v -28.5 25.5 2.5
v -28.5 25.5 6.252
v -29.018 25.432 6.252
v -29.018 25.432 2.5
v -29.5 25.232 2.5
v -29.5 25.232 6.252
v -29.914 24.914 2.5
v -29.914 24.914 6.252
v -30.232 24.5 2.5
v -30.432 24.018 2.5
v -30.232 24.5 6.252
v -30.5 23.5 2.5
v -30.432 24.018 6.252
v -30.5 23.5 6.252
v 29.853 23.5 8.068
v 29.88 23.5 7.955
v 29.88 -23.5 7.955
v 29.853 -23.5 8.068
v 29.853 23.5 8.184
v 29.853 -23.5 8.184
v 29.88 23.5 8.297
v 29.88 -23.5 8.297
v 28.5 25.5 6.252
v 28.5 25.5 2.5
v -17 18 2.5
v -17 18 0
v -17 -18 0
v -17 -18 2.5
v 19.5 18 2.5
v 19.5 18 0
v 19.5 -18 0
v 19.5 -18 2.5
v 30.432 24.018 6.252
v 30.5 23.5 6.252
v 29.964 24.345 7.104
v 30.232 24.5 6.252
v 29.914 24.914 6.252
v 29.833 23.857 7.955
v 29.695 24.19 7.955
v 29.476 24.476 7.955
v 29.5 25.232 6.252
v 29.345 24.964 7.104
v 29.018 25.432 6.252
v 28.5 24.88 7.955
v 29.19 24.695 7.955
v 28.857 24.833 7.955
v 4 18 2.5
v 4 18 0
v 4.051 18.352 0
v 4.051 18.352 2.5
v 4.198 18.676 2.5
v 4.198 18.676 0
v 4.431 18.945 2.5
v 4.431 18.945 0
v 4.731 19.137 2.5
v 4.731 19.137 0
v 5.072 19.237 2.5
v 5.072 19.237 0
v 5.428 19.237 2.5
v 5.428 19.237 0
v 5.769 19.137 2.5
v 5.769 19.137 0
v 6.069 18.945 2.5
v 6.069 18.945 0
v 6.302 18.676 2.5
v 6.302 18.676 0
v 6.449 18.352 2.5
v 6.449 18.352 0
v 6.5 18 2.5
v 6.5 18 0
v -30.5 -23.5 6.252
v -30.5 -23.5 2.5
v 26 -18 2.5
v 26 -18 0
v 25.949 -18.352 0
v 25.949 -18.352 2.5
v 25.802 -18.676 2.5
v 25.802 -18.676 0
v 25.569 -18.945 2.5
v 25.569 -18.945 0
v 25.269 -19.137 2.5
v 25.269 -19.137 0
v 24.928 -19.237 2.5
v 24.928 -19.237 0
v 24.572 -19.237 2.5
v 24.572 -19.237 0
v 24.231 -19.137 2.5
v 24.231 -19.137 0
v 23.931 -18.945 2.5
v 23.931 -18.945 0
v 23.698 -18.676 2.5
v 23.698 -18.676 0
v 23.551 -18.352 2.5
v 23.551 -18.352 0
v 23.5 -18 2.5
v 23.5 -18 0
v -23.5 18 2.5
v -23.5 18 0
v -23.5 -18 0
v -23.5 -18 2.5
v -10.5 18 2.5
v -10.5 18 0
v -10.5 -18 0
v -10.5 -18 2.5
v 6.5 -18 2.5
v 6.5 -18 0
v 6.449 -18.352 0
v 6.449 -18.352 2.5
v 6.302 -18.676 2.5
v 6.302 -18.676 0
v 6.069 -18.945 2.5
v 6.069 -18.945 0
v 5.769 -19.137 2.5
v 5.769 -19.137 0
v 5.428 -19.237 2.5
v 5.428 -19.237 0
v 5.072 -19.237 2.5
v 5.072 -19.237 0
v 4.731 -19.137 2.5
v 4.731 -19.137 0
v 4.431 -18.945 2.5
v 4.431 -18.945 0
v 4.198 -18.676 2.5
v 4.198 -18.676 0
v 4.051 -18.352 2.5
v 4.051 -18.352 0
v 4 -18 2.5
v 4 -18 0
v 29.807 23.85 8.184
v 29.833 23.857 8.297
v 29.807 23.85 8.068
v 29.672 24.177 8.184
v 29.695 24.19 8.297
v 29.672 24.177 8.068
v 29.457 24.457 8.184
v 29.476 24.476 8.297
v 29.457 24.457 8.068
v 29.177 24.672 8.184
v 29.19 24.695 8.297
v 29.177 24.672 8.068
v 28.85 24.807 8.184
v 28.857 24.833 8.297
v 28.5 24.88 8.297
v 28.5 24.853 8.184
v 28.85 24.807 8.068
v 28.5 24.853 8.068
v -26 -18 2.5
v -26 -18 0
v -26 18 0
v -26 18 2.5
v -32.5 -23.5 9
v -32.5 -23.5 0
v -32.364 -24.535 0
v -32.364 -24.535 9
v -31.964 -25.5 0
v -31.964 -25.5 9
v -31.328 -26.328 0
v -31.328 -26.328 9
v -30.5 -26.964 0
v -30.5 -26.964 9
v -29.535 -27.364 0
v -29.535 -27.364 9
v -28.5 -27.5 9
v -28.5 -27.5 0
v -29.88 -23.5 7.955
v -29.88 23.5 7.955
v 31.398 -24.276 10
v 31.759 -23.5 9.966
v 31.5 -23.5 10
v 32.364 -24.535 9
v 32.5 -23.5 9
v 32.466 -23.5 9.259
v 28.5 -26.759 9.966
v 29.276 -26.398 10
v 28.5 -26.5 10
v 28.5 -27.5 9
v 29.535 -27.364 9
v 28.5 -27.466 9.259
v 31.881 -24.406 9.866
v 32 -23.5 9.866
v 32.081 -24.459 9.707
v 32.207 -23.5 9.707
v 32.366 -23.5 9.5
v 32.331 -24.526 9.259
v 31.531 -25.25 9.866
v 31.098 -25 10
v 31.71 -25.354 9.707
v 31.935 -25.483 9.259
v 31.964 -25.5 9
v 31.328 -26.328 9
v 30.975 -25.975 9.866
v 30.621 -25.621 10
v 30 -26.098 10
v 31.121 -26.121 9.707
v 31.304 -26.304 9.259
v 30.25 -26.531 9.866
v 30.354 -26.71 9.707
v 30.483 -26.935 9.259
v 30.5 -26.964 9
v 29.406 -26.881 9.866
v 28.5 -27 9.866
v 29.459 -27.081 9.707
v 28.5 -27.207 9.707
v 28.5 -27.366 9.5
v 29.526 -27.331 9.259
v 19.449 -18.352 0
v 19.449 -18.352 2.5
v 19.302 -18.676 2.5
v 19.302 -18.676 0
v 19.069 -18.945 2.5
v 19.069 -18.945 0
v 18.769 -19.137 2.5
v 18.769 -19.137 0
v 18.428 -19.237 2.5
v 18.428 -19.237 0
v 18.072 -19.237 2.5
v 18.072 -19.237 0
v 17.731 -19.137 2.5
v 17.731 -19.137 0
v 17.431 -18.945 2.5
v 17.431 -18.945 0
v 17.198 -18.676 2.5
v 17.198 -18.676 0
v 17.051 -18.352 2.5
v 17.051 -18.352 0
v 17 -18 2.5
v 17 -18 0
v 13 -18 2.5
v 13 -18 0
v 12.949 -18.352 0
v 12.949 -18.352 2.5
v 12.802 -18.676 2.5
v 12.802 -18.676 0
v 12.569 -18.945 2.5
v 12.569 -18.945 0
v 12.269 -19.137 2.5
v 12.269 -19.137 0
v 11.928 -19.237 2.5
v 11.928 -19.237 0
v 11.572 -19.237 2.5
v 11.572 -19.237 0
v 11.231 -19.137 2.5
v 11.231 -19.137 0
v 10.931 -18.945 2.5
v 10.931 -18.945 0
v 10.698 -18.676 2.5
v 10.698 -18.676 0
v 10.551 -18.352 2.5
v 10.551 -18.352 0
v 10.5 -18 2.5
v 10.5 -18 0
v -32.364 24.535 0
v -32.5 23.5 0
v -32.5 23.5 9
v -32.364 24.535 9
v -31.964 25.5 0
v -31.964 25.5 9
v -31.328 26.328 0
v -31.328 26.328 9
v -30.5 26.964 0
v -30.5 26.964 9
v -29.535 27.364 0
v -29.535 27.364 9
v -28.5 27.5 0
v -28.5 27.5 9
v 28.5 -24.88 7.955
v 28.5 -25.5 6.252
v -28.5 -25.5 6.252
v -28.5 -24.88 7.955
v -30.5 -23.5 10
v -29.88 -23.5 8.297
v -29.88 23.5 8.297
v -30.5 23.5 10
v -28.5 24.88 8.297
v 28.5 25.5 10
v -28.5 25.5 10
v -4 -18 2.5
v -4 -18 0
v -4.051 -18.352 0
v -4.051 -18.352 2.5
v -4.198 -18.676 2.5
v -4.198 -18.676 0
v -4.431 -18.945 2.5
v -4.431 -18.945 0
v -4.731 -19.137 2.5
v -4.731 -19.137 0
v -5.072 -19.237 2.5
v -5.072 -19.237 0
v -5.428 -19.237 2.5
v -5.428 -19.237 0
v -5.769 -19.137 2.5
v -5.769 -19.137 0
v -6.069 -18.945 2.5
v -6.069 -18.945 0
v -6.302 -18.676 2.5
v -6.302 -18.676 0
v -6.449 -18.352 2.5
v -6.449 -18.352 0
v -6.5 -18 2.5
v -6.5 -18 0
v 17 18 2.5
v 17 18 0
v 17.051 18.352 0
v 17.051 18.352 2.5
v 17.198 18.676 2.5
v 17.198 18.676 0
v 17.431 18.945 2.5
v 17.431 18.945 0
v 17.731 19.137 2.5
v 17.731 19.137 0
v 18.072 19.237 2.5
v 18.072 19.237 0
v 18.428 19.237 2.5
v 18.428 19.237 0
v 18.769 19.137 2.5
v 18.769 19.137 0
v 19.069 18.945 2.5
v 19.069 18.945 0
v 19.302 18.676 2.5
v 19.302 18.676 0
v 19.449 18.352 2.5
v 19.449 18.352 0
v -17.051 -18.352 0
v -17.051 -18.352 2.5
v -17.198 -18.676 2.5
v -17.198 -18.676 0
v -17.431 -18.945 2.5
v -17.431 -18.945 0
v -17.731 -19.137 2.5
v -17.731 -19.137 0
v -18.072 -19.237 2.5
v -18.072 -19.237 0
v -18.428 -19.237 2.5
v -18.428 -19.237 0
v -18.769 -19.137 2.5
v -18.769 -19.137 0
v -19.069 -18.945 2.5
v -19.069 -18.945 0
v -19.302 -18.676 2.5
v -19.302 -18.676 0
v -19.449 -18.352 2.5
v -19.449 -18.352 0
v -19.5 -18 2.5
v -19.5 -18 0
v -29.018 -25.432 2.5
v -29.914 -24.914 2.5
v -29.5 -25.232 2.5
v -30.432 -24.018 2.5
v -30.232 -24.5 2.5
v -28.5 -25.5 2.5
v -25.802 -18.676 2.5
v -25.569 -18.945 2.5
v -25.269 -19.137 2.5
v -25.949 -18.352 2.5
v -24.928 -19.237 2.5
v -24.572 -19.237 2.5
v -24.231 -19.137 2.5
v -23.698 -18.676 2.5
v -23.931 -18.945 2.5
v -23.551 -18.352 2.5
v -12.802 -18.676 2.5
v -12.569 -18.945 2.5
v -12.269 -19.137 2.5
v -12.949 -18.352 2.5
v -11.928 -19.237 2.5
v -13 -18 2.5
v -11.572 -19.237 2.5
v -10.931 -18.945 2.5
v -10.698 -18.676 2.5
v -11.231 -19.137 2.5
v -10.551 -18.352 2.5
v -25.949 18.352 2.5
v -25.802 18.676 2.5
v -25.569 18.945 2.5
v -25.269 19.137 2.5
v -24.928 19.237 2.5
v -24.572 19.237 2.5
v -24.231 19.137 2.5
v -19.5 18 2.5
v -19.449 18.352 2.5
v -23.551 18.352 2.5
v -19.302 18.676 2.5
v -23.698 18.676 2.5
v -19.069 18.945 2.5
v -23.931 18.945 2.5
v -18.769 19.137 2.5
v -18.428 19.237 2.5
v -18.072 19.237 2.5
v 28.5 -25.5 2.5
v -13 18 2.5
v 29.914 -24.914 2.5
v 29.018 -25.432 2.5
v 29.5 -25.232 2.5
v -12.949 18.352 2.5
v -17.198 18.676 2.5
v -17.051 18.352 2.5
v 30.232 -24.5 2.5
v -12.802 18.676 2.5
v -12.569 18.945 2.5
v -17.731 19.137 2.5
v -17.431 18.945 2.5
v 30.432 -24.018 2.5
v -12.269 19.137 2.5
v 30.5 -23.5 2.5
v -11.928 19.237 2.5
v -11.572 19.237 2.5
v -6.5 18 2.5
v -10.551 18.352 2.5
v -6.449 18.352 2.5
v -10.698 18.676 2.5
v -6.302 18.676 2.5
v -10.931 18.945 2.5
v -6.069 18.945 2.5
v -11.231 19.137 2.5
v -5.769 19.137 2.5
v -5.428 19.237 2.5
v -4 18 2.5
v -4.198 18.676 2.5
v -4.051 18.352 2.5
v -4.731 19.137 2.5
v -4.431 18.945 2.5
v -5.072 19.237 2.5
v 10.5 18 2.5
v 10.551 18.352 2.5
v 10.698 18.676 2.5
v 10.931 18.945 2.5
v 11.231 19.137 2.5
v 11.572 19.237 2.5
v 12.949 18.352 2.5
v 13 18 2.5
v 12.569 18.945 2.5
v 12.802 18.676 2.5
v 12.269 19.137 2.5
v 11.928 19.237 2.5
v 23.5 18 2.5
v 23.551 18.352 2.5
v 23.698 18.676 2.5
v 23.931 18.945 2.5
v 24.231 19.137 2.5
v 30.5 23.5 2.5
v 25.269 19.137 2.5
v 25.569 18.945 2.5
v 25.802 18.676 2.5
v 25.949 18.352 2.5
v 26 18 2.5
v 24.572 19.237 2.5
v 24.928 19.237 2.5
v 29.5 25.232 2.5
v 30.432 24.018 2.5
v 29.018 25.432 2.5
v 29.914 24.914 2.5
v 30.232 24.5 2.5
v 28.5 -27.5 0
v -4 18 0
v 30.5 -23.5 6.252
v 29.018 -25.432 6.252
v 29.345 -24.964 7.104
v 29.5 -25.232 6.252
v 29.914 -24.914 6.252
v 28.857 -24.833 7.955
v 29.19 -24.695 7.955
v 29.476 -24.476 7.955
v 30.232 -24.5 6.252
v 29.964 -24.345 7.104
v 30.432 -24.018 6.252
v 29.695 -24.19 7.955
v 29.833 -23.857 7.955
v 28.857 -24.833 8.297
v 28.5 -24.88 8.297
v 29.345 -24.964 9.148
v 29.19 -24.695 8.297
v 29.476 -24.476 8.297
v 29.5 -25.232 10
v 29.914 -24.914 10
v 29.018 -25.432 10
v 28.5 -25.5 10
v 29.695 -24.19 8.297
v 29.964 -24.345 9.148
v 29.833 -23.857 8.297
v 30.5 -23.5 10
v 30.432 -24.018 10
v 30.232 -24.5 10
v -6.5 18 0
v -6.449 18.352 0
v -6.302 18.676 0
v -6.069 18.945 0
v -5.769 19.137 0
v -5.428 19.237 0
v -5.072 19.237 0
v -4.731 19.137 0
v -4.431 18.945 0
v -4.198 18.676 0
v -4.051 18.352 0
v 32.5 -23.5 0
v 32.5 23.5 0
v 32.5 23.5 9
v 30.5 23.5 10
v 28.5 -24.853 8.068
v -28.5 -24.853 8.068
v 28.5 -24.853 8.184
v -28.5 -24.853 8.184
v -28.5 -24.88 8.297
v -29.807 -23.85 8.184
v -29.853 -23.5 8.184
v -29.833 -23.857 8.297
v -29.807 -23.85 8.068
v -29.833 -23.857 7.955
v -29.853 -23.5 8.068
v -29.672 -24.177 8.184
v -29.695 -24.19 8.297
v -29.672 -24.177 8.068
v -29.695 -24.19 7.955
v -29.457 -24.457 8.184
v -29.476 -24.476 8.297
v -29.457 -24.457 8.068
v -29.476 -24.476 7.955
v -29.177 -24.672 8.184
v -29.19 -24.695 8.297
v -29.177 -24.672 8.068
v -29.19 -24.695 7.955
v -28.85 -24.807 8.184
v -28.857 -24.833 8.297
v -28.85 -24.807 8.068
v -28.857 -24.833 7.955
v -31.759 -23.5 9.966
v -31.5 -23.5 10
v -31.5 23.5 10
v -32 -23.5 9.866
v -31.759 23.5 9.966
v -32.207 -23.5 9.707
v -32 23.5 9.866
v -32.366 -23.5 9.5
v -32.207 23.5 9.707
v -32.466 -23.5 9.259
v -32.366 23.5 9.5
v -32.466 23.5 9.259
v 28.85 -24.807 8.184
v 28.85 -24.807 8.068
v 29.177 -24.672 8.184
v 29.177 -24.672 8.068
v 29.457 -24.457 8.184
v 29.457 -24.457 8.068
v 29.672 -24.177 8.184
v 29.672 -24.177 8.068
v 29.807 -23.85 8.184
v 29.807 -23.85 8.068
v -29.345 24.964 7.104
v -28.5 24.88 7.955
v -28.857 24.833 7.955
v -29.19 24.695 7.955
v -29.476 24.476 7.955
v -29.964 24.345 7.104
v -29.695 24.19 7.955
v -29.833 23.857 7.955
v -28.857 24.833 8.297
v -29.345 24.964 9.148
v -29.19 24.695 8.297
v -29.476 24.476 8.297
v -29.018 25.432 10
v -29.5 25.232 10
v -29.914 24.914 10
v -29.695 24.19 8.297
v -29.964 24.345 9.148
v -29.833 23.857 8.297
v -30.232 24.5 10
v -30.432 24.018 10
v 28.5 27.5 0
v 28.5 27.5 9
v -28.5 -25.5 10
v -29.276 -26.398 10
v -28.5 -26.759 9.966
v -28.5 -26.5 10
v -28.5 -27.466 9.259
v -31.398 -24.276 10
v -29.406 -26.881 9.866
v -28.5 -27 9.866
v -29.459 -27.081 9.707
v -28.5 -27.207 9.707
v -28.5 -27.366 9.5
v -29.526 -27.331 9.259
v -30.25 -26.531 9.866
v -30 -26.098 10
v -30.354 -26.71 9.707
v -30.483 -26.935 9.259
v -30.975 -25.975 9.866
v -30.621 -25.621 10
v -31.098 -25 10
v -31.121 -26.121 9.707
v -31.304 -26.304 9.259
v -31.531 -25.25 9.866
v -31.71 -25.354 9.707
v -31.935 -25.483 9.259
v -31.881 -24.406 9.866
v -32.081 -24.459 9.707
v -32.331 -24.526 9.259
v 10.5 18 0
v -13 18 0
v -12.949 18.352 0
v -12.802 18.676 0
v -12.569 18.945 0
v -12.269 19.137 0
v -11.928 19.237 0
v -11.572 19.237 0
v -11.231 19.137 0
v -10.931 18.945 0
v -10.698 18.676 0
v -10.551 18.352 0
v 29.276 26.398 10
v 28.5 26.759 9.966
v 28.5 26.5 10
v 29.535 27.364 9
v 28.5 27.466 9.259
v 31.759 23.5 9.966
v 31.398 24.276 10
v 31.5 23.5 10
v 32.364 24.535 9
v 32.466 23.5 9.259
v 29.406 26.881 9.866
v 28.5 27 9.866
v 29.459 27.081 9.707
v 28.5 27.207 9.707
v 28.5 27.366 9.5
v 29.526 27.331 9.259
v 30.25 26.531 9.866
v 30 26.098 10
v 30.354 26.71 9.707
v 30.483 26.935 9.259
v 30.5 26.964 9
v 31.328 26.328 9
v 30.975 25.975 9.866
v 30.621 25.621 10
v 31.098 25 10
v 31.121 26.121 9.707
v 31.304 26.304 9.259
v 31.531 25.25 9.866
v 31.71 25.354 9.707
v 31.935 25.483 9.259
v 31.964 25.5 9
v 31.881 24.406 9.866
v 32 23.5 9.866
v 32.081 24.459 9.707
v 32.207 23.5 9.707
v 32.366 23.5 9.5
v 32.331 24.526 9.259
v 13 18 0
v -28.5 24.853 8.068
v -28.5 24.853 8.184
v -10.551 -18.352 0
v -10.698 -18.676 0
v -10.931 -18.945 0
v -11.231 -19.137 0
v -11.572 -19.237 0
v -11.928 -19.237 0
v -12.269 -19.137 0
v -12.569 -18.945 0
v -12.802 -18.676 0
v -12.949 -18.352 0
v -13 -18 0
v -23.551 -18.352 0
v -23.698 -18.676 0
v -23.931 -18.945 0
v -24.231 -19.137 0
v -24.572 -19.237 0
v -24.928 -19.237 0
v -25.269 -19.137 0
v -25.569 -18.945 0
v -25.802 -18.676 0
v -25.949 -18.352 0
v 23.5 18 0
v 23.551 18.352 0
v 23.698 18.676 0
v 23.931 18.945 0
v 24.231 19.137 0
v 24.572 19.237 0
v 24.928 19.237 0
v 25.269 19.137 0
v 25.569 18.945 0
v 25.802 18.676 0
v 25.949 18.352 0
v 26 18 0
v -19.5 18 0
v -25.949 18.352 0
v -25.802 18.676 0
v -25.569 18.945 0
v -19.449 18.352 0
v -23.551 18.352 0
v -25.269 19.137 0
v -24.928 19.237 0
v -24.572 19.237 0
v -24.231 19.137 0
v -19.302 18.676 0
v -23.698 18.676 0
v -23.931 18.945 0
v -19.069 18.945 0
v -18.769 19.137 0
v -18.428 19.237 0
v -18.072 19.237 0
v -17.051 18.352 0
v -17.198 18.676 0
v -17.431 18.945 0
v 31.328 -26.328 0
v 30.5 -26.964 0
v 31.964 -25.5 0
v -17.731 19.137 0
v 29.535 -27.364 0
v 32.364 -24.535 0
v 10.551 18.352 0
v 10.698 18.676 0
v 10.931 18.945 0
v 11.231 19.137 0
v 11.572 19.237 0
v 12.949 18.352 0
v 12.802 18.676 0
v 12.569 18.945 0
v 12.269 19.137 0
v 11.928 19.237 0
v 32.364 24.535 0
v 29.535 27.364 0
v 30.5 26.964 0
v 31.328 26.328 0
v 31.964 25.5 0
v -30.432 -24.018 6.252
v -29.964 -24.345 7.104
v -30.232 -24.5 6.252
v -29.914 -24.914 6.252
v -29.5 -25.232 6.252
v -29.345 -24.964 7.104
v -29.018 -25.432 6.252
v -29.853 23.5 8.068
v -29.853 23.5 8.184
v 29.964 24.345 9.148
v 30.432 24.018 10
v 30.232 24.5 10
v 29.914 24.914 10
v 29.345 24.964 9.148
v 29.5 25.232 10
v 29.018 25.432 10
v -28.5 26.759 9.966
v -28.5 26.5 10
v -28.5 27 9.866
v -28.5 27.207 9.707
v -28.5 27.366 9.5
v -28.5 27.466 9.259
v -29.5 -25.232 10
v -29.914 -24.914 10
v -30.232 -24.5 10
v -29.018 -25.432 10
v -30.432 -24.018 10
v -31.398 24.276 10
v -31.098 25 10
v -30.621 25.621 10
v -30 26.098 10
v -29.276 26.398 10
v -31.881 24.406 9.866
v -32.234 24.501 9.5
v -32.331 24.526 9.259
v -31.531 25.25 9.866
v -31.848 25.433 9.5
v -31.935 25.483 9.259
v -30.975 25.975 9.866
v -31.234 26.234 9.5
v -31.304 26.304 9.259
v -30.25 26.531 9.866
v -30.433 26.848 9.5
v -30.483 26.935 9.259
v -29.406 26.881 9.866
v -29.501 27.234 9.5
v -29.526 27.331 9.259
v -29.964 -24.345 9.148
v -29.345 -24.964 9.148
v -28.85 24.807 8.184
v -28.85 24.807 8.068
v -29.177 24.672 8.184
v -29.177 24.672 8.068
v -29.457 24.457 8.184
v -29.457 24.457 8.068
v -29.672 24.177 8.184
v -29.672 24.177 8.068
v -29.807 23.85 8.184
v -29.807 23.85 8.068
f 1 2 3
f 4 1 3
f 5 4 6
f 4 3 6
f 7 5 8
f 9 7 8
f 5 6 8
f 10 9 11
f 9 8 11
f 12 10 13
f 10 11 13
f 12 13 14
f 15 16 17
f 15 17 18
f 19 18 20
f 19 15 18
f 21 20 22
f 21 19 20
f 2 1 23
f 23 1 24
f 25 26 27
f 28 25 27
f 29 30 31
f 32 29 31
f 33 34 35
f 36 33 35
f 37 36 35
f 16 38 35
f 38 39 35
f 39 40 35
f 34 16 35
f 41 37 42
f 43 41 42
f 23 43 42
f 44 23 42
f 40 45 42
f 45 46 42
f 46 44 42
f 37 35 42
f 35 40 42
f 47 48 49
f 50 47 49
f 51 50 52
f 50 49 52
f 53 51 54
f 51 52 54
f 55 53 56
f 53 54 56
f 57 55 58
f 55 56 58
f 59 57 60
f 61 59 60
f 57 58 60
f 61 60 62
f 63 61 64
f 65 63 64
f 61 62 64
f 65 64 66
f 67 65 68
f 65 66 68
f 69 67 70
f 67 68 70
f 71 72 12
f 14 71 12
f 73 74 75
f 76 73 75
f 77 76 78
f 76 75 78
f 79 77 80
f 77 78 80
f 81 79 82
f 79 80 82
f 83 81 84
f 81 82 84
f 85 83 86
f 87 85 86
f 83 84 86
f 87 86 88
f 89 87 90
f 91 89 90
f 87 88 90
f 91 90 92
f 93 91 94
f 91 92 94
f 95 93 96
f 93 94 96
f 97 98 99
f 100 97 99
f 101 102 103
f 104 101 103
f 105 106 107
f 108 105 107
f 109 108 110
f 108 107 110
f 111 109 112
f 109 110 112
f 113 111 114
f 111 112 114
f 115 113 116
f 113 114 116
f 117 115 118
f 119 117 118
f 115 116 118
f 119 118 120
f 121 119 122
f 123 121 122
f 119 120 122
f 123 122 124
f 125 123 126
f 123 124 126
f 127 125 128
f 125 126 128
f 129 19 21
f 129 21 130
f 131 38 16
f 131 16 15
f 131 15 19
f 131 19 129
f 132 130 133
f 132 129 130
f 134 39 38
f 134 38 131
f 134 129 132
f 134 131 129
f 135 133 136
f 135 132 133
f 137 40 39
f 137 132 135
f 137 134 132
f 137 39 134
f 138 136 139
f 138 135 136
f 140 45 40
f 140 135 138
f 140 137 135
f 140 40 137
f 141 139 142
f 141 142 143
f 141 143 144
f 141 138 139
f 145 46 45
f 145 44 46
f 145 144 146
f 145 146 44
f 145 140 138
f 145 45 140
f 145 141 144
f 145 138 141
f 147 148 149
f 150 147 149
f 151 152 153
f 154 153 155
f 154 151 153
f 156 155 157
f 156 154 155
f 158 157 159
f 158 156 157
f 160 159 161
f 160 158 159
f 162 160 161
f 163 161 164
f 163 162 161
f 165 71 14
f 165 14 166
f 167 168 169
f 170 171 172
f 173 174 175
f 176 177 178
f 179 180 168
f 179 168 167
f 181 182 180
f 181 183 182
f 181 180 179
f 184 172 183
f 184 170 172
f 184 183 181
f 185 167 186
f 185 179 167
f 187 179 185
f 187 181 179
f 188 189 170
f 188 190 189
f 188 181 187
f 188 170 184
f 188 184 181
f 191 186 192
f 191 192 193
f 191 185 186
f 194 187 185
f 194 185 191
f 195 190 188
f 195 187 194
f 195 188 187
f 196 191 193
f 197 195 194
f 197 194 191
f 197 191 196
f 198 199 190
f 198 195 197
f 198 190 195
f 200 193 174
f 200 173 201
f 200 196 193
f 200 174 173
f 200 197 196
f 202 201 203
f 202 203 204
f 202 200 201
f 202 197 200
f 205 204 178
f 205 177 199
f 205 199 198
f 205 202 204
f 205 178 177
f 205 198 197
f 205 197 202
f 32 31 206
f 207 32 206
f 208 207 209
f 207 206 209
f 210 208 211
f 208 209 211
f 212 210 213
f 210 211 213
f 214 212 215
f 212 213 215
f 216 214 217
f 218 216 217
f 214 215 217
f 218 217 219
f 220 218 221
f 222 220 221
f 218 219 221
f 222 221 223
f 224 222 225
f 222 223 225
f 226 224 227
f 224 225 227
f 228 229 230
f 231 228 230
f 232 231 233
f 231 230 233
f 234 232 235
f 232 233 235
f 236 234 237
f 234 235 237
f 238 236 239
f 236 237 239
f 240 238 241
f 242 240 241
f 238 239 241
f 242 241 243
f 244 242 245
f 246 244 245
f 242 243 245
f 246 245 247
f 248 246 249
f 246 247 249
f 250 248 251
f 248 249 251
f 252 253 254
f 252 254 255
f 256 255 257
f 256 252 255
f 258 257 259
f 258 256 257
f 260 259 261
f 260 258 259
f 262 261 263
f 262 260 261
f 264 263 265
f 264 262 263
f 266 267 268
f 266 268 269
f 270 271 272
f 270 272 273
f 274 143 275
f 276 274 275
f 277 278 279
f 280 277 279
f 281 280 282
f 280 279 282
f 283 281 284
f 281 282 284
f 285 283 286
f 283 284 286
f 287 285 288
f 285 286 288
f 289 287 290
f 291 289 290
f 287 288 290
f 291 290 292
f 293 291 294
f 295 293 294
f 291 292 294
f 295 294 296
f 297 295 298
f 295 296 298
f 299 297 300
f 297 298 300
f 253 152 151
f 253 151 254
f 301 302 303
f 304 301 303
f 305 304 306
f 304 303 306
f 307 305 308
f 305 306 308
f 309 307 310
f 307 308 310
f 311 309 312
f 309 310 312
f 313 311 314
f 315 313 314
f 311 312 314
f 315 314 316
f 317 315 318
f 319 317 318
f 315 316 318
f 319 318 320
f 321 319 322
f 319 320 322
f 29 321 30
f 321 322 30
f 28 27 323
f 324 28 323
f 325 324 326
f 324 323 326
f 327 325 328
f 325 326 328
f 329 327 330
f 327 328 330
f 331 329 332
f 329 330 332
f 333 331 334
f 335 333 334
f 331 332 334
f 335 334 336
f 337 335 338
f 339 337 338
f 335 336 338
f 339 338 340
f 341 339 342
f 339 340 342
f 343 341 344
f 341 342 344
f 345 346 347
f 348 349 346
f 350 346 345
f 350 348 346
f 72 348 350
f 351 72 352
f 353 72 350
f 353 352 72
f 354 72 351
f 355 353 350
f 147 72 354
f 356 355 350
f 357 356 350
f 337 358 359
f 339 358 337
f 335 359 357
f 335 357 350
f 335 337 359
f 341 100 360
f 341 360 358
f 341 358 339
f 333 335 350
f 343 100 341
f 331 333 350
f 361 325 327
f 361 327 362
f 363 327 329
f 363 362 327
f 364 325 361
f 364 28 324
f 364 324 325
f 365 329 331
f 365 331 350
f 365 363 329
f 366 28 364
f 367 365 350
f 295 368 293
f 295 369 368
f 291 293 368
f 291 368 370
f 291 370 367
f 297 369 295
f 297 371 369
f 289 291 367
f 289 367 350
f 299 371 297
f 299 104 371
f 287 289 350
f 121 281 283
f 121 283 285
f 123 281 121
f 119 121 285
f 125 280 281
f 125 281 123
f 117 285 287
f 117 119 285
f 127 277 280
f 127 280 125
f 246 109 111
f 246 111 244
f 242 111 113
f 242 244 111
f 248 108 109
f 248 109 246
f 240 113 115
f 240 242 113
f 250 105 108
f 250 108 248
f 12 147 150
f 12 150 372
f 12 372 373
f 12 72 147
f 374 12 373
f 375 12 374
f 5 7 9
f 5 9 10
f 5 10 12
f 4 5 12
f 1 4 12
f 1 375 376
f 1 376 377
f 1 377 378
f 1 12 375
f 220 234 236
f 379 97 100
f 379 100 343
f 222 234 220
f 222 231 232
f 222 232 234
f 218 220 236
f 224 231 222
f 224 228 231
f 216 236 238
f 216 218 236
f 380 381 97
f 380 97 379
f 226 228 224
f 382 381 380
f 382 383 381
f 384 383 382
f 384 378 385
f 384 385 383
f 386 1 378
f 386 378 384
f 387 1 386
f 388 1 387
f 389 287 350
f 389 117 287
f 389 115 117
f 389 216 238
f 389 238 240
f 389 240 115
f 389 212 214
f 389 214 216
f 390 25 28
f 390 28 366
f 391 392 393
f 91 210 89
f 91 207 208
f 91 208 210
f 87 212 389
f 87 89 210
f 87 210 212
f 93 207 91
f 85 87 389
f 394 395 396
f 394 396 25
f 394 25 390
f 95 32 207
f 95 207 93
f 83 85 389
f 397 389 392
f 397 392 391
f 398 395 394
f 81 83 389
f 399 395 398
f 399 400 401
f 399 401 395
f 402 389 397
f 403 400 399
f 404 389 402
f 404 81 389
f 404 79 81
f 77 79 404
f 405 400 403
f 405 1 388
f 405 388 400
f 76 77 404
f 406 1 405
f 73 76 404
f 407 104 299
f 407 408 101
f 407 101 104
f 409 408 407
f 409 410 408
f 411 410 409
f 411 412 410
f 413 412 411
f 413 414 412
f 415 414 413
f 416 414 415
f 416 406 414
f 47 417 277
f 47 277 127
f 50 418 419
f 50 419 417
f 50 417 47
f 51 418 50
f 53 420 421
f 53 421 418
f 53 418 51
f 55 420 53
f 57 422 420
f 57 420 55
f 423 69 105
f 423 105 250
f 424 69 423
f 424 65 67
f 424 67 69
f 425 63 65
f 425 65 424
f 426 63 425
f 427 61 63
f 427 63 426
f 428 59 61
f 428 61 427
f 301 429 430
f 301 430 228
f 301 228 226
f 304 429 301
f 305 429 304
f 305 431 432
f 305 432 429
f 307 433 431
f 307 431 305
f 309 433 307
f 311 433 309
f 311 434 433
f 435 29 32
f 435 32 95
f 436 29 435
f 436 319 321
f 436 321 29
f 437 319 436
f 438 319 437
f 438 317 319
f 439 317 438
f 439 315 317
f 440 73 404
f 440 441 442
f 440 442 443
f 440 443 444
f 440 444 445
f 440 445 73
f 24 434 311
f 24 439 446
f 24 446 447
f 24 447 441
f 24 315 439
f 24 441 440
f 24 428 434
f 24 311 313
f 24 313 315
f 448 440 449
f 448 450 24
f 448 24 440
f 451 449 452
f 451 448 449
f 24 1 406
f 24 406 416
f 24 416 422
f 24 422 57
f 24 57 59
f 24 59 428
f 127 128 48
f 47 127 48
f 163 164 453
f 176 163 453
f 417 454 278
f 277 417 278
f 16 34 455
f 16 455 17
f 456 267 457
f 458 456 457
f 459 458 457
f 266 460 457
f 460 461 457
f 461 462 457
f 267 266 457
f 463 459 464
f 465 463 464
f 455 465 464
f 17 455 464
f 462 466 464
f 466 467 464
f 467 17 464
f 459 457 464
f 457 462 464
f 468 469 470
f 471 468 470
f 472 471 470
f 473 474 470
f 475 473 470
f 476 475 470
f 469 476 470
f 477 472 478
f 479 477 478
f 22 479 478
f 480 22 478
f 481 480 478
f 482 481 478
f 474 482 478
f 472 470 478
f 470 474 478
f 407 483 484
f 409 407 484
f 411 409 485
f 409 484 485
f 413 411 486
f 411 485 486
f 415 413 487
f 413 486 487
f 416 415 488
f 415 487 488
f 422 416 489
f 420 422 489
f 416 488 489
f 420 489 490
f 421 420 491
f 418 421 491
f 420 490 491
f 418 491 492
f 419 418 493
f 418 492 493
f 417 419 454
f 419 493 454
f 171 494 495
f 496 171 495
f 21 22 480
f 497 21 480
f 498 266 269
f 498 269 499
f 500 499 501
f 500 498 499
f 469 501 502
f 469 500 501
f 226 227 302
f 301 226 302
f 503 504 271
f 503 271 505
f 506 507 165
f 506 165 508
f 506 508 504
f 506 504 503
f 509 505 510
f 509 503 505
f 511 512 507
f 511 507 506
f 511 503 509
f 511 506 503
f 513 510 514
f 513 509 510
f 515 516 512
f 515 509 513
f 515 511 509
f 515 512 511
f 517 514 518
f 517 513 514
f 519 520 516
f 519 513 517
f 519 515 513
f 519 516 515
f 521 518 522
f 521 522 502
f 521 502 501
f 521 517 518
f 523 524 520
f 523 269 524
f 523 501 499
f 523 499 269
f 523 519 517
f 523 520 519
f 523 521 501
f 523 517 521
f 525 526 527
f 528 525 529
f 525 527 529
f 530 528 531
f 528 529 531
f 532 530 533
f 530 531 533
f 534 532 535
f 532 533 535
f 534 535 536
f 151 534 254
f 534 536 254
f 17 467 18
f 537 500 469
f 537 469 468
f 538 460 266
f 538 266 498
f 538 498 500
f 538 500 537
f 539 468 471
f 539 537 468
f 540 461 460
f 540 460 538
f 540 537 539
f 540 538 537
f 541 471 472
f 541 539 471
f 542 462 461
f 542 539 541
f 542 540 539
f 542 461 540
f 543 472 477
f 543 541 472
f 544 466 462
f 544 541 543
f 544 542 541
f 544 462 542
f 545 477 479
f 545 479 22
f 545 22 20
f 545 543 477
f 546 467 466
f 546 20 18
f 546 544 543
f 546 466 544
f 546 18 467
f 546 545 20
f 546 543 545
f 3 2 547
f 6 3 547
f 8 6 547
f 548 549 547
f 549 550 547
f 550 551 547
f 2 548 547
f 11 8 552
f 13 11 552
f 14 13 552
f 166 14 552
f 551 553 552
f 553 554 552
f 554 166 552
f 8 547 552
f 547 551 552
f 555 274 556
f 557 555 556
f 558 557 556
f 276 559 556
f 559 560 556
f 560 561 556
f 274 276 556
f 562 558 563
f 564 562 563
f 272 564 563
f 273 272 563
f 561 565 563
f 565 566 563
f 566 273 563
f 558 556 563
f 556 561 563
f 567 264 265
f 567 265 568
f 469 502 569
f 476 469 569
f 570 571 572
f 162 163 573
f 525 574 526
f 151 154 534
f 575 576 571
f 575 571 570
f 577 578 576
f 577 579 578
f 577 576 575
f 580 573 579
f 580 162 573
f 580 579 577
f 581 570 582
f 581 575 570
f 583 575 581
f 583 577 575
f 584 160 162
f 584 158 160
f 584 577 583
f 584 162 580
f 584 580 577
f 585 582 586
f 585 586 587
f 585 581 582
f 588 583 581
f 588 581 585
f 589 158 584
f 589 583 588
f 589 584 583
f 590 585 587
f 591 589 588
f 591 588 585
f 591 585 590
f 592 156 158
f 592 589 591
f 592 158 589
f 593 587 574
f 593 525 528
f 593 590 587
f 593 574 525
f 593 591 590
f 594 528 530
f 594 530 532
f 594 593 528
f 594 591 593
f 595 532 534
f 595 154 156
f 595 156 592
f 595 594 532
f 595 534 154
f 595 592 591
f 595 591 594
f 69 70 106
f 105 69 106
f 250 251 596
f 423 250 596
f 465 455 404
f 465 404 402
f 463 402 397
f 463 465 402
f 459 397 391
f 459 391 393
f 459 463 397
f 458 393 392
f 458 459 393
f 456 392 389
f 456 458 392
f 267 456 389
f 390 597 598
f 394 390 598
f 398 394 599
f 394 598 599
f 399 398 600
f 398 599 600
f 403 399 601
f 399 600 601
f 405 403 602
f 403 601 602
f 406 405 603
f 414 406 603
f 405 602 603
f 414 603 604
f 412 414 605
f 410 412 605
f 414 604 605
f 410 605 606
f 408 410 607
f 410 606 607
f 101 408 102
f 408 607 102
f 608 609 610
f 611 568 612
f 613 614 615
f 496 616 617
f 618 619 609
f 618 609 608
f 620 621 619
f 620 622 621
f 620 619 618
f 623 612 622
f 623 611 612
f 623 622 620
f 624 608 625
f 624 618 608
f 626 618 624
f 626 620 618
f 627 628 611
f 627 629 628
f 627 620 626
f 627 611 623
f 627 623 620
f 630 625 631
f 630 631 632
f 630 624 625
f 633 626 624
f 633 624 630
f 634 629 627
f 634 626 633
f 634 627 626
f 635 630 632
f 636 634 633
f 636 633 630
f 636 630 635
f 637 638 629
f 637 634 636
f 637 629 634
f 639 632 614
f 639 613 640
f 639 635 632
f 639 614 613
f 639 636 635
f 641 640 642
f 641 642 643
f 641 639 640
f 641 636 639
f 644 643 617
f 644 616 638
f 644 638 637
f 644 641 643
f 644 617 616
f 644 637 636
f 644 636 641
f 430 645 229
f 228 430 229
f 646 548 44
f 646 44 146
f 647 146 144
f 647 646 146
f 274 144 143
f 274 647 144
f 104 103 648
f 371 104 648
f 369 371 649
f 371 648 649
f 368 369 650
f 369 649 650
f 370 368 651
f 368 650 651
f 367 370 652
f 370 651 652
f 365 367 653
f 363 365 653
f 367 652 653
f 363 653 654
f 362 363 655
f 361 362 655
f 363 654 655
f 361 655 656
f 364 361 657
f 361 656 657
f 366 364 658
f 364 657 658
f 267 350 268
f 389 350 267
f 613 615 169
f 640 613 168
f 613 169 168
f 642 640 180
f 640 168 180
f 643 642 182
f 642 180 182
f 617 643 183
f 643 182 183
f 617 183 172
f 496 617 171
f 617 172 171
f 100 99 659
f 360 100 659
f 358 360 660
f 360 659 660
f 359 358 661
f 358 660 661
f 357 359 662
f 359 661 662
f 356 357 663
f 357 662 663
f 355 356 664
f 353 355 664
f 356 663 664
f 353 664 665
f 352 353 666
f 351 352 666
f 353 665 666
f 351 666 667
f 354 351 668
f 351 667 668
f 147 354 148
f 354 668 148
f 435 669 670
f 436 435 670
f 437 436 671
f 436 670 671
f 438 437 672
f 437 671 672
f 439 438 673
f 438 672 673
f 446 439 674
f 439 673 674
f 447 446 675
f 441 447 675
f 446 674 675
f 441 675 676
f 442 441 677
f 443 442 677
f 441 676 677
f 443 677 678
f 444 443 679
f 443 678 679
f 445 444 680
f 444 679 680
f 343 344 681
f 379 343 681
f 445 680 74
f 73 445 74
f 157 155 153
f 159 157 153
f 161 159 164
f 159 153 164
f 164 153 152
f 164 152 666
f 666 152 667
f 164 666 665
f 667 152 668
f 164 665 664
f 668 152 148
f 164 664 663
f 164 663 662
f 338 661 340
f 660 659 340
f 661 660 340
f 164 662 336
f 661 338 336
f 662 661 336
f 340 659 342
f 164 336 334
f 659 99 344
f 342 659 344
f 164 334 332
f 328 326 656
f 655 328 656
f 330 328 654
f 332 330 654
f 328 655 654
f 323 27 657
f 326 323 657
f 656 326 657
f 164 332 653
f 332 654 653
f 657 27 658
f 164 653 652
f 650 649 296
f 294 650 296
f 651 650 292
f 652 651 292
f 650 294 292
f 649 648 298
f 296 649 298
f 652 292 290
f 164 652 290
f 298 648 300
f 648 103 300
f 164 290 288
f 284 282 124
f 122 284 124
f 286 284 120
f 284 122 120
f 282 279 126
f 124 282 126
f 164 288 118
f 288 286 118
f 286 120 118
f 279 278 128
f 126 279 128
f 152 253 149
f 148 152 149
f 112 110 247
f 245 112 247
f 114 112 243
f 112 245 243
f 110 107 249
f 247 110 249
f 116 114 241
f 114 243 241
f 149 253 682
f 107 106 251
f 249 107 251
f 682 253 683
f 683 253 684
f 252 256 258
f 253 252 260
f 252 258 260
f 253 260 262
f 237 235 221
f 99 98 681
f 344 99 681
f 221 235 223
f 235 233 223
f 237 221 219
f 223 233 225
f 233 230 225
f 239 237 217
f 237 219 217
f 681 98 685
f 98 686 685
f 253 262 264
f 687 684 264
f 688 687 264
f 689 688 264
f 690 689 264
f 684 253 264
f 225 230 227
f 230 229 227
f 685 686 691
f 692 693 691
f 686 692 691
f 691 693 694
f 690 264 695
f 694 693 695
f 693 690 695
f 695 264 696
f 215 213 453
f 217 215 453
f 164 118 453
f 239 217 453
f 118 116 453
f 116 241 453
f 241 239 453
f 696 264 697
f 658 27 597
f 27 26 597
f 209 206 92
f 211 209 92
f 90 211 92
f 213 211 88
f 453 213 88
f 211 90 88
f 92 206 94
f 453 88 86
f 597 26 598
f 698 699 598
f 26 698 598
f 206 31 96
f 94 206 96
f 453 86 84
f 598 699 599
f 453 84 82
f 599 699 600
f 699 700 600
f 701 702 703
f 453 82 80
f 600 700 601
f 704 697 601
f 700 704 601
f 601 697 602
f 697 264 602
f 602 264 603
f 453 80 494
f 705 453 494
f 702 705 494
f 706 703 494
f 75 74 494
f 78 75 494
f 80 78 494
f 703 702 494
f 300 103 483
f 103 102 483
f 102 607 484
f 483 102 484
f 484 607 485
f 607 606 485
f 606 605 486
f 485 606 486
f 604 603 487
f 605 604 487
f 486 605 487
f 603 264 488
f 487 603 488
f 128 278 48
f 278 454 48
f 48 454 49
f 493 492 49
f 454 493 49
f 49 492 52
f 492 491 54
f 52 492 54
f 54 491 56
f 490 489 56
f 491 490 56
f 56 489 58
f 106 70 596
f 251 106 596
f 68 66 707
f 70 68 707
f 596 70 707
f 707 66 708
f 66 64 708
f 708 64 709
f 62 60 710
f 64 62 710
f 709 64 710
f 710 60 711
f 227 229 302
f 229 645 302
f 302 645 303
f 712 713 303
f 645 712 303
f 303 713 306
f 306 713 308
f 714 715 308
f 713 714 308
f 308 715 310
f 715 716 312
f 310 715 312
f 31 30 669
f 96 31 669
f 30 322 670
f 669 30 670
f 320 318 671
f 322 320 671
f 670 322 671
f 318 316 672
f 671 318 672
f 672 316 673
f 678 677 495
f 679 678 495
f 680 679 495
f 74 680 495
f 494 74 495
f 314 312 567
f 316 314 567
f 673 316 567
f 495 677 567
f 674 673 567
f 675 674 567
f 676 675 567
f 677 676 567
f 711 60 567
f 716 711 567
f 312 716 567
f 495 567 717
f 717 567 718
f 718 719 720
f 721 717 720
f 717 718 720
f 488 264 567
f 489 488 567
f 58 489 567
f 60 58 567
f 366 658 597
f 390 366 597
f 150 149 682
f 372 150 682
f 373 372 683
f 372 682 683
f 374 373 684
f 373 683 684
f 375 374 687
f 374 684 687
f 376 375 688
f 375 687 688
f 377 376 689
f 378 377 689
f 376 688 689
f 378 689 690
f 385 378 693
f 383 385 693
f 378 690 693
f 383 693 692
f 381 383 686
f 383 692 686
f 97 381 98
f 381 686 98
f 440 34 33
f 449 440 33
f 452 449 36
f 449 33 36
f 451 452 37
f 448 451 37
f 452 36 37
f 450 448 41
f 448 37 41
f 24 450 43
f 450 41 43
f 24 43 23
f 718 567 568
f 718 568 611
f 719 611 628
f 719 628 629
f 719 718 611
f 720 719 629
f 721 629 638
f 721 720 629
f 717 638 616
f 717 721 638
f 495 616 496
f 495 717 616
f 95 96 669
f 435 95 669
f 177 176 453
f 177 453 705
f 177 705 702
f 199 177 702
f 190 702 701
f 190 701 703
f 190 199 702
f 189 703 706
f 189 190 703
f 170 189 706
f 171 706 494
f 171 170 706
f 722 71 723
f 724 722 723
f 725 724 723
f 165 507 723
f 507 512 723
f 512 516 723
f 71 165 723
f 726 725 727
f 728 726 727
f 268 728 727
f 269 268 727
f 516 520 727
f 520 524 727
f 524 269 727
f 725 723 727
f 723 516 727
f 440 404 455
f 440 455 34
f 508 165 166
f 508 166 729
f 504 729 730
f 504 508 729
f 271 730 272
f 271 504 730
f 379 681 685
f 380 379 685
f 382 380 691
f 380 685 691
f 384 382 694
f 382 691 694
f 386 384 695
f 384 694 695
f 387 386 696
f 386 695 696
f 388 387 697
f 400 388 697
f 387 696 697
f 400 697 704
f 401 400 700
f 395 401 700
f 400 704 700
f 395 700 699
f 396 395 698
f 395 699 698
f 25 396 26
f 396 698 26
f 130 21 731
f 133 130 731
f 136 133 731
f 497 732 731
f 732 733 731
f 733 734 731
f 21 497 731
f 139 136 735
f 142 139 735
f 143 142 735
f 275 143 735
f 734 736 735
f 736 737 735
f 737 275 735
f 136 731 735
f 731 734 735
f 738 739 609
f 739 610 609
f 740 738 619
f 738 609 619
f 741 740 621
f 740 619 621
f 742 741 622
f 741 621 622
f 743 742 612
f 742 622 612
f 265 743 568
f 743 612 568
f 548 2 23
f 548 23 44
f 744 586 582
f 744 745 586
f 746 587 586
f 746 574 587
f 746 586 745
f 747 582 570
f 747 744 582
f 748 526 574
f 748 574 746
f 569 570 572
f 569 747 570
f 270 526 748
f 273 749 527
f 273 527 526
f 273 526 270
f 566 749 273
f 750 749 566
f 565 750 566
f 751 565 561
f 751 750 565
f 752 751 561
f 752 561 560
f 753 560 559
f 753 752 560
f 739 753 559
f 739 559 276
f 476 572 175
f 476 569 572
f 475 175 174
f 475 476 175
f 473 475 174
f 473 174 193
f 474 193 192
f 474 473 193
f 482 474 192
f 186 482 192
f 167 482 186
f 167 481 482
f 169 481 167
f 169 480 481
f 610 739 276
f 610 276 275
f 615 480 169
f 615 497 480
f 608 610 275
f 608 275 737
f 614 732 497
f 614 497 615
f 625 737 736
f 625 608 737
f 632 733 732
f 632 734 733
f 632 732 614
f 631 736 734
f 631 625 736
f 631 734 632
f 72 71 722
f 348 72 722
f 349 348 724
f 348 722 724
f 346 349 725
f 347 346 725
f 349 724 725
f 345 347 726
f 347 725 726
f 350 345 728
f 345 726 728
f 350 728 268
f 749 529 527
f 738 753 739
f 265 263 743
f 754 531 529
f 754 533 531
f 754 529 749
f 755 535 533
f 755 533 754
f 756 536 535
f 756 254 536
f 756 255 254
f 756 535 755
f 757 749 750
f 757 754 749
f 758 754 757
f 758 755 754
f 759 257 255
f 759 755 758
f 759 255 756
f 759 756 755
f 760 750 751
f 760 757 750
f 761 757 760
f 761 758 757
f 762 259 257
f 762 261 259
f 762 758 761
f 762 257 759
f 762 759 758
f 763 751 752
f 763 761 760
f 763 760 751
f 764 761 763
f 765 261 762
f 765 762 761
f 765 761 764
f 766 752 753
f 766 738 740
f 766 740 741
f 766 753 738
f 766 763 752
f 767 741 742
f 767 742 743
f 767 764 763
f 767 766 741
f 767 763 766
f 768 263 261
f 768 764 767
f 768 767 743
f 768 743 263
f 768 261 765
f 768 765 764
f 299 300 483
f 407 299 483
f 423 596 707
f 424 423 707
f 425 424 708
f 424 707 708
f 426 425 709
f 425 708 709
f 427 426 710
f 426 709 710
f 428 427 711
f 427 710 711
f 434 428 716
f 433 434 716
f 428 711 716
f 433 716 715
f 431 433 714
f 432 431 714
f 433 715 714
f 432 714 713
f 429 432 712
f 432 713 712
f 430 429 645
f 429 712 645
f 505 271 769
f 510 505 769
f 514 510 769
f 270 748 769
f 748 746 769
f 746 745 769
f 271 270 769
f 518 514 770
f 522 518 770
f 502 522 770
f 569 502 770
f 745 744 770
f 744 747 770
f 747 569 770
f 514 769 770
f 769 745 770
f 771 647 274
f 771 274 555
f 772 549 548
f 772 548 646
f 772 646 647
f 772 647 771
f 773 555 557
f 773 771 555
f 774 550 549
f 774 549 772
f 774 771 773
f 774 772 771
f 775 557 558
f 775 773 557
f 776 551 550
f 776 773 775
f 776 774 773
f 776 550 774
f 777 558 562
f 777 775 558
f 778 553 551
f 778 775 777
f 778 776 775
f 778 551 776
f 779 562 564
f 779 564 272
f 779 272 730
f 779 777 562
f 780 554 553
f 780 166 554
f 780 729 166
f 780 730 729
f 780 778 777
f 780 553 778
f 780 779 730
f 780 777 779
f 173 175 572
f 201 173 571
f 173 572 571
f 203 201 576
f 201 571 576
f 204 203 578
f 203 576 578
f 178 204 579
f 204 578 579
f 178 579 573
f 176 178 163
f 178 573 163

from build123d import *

# Parameters (mm, degrees)
F0_W     = 65
F0_H     = 55
F0_W_2   = 61
F0_H_2   = 51
F1_DEPTH = 2.5
F2_DEPTH = 10
F3_R     = 2
F4_R     = 4
F7_R     = 1


with BuildPart() as f1:
    # F0 (on Top) → F1 (new body)
    with BuildSketch(Plane.XY):
        Rectangle(F0_W, F0_H)
        Rectangle(F0_W_2, F0_H_2, mode=Mode.SUBTRACT)
        Rectangle(F0_W_2, F0_H_2)
        with BuildLine():
            ThreePointArc((-26, 18), (-24.75, 19.25), (-23.5, 18))
            Line((-23.5, 18), (-23.5, -18))
            ThreePointArc((-23.5, -18), (-24.75, -19.25), (-26, -18))
            Line((-26, -18), (-26, 18))
        make_face(mode=Mode.SUBTRACT)
        with BuildLine():
            Line((-19.5, -18), (-19.5, 18))
            ThreePointArc((-19.5, 18), (-18.25, 19.25), (-17, 18))
            Line((-17, 18), (-17, -18))
            ThreePointArc((-17, -18), (-18.25, -19.25), (-19.5, -18))
        make_face(mode=Mode.SUBTRACT)
        with BuildLine():
            Line((-13, -18), (-13, 18))
            ThreePointArc((-13, 18), (-11.75, 19.25), (-10.5, 18))
            Line((-10.5, 18), (-10.5, -18))
            ThreePointArc((-10.5, -18), (-11.75, -19.25), (-13, -18))
        make_face(mode=Mode.SUBTRACT)
        with BuildLine():
            Line((-6.5, -18), (-6.5, 18))
            ThreePointArc((-6.5, 18), (-5.25, 19.25), (-4, 18))
            Line((-4, 18), (-4, -18))
            ThreePointArc((-4, -18), (-5.25, -19.25), (-6.5, -18))
        make_face(mode=Mode.SUBTRACT)
        with BuildLine():
            Line((4, -18), (4, 18))
            ThreePointArc((4, 18), (5.25, 19.25), (6.5, 18))
            Line((6.5, 18), (6.5, -18))
            ThreePointArc((6.5, -18), (5.25, -19.25), (4, -18))
        make_face(mode=Mode.SUBTRACT)
        with BuildLine():
            Line((10.5, -18), (10.5, 18))
            ThreePointArc((10.5, 18), (11.75, 19.25), (13, 18))
            Line((13, 18), (13, -18))
            ThreePointArc((13, -18), (11.75, -19.25), (10.5, -18))
        make_face(mode=Mode.SUBTRACT)
        with BuildLine():
            ThreePointArc((17, 18), (18.25, 19.25), (19.5, 18))
            Line((19.5, 18), (19.5, -18))
            ThreePointArc((19.5, -18), (18.25, -19.25), (17, -18))
            Line((17, -18), (17, 18))
        make_face(mode=Mode.SUBTRACT)
        with BuildLine():
            Line((23.5, -18), (23.5, 18))
            ThreePointArc((23.5, 18), (24.75, 19.25), (26, 18))
            Line((26, 18), (26, -18))
            ThreePointArc((26, -18), (24.75, -19.25), (23.5, -18))
        make_face(mode=Mode.SUBTRACT)
    extrude(amount=F1_DEPTH)

    # F0 (on Top) → F2 (join)
    with BuildSketch(Plane.XY):
        Rectangle(F0_W, F0_H)
        Rectangle(F0_W_2, F0_H_2, mode=Mode.SUBTRACT)
    extrude(amount=F2_DEPTH)

    # F3
    f3_edges = [f1.edges().sort_by_distance(p)[0] for p in [
        (-30.5, 25.5, 6.25),
        (30.5, 25.5, 6.25),
        (-30.5, -25.5, 6.25),
        (30.5, -25.5, 6.25),
    ]]
    fillet(f3_edges, radius=F3_R)

    # F4
    f4_edges = [f1.edges().sort_by_distance(p)[0] for p in [
        (-32.5, 27.5, 5),
        (32.5, 27.5, 5),
        (-32.5, -27.5, 5),
        (32.5, -27.5, 5),
    ]]
    fillet(f4_edges, radius=F4_R)

    # F6: sweep along a path in F6_path
    with BuildLine(Plane(origin=(-30.5, 23.5, 10), x_dir=(0, 1, 0), z_dir=(0, 0, 1))) as f6_path:
        Line((0, 0), (-47, 0))
        ThreePointArc((-47, 0), (-48.4142135624, -0.5857864376), (-49, -2))
        Line((-49, -2), (-49, -59))
        ThreePointArc((-49, -59), (-48.4142135624, -60.4142135624), (-47, -61))
        Line((-47, -61), (0, -61))
        ThreePointArc((0, -61), (1.4142135624, -60.4142135624), (2, -59))
        Line((2, -59), (2, -2))
        ThreePointArc((2, -2), (1.4142135624, -0.5857864376), (0, 0))
    # F5 (on Front) → F6 (sweep)
    with BuildSketch(Plane.XZ):
        with BuildLine():
            Line((-30.5, 10), (-30.5, 6.2521283853))
            Line((-30.5, 6.2521283853), (-29.8801235899, 7.9552248249))
            ThreePointArc((-29.8801235899, 7.9552248249), (-29.85, 8.1260641927), (-29.8801235899, 8.2969035604))
            Line((-29.8801235899, 8.2969035604), (-30.5, 10))
        make_face()
    sweep(path=f6_path.line)

    # F7
    f7_edges = [f1.edges().sort_by_distance(p)[0] for p in [
        (0, 27.5, 10),
    ]]
    fillet(f7_edges, radius=F7_R)


solid = f1.part
